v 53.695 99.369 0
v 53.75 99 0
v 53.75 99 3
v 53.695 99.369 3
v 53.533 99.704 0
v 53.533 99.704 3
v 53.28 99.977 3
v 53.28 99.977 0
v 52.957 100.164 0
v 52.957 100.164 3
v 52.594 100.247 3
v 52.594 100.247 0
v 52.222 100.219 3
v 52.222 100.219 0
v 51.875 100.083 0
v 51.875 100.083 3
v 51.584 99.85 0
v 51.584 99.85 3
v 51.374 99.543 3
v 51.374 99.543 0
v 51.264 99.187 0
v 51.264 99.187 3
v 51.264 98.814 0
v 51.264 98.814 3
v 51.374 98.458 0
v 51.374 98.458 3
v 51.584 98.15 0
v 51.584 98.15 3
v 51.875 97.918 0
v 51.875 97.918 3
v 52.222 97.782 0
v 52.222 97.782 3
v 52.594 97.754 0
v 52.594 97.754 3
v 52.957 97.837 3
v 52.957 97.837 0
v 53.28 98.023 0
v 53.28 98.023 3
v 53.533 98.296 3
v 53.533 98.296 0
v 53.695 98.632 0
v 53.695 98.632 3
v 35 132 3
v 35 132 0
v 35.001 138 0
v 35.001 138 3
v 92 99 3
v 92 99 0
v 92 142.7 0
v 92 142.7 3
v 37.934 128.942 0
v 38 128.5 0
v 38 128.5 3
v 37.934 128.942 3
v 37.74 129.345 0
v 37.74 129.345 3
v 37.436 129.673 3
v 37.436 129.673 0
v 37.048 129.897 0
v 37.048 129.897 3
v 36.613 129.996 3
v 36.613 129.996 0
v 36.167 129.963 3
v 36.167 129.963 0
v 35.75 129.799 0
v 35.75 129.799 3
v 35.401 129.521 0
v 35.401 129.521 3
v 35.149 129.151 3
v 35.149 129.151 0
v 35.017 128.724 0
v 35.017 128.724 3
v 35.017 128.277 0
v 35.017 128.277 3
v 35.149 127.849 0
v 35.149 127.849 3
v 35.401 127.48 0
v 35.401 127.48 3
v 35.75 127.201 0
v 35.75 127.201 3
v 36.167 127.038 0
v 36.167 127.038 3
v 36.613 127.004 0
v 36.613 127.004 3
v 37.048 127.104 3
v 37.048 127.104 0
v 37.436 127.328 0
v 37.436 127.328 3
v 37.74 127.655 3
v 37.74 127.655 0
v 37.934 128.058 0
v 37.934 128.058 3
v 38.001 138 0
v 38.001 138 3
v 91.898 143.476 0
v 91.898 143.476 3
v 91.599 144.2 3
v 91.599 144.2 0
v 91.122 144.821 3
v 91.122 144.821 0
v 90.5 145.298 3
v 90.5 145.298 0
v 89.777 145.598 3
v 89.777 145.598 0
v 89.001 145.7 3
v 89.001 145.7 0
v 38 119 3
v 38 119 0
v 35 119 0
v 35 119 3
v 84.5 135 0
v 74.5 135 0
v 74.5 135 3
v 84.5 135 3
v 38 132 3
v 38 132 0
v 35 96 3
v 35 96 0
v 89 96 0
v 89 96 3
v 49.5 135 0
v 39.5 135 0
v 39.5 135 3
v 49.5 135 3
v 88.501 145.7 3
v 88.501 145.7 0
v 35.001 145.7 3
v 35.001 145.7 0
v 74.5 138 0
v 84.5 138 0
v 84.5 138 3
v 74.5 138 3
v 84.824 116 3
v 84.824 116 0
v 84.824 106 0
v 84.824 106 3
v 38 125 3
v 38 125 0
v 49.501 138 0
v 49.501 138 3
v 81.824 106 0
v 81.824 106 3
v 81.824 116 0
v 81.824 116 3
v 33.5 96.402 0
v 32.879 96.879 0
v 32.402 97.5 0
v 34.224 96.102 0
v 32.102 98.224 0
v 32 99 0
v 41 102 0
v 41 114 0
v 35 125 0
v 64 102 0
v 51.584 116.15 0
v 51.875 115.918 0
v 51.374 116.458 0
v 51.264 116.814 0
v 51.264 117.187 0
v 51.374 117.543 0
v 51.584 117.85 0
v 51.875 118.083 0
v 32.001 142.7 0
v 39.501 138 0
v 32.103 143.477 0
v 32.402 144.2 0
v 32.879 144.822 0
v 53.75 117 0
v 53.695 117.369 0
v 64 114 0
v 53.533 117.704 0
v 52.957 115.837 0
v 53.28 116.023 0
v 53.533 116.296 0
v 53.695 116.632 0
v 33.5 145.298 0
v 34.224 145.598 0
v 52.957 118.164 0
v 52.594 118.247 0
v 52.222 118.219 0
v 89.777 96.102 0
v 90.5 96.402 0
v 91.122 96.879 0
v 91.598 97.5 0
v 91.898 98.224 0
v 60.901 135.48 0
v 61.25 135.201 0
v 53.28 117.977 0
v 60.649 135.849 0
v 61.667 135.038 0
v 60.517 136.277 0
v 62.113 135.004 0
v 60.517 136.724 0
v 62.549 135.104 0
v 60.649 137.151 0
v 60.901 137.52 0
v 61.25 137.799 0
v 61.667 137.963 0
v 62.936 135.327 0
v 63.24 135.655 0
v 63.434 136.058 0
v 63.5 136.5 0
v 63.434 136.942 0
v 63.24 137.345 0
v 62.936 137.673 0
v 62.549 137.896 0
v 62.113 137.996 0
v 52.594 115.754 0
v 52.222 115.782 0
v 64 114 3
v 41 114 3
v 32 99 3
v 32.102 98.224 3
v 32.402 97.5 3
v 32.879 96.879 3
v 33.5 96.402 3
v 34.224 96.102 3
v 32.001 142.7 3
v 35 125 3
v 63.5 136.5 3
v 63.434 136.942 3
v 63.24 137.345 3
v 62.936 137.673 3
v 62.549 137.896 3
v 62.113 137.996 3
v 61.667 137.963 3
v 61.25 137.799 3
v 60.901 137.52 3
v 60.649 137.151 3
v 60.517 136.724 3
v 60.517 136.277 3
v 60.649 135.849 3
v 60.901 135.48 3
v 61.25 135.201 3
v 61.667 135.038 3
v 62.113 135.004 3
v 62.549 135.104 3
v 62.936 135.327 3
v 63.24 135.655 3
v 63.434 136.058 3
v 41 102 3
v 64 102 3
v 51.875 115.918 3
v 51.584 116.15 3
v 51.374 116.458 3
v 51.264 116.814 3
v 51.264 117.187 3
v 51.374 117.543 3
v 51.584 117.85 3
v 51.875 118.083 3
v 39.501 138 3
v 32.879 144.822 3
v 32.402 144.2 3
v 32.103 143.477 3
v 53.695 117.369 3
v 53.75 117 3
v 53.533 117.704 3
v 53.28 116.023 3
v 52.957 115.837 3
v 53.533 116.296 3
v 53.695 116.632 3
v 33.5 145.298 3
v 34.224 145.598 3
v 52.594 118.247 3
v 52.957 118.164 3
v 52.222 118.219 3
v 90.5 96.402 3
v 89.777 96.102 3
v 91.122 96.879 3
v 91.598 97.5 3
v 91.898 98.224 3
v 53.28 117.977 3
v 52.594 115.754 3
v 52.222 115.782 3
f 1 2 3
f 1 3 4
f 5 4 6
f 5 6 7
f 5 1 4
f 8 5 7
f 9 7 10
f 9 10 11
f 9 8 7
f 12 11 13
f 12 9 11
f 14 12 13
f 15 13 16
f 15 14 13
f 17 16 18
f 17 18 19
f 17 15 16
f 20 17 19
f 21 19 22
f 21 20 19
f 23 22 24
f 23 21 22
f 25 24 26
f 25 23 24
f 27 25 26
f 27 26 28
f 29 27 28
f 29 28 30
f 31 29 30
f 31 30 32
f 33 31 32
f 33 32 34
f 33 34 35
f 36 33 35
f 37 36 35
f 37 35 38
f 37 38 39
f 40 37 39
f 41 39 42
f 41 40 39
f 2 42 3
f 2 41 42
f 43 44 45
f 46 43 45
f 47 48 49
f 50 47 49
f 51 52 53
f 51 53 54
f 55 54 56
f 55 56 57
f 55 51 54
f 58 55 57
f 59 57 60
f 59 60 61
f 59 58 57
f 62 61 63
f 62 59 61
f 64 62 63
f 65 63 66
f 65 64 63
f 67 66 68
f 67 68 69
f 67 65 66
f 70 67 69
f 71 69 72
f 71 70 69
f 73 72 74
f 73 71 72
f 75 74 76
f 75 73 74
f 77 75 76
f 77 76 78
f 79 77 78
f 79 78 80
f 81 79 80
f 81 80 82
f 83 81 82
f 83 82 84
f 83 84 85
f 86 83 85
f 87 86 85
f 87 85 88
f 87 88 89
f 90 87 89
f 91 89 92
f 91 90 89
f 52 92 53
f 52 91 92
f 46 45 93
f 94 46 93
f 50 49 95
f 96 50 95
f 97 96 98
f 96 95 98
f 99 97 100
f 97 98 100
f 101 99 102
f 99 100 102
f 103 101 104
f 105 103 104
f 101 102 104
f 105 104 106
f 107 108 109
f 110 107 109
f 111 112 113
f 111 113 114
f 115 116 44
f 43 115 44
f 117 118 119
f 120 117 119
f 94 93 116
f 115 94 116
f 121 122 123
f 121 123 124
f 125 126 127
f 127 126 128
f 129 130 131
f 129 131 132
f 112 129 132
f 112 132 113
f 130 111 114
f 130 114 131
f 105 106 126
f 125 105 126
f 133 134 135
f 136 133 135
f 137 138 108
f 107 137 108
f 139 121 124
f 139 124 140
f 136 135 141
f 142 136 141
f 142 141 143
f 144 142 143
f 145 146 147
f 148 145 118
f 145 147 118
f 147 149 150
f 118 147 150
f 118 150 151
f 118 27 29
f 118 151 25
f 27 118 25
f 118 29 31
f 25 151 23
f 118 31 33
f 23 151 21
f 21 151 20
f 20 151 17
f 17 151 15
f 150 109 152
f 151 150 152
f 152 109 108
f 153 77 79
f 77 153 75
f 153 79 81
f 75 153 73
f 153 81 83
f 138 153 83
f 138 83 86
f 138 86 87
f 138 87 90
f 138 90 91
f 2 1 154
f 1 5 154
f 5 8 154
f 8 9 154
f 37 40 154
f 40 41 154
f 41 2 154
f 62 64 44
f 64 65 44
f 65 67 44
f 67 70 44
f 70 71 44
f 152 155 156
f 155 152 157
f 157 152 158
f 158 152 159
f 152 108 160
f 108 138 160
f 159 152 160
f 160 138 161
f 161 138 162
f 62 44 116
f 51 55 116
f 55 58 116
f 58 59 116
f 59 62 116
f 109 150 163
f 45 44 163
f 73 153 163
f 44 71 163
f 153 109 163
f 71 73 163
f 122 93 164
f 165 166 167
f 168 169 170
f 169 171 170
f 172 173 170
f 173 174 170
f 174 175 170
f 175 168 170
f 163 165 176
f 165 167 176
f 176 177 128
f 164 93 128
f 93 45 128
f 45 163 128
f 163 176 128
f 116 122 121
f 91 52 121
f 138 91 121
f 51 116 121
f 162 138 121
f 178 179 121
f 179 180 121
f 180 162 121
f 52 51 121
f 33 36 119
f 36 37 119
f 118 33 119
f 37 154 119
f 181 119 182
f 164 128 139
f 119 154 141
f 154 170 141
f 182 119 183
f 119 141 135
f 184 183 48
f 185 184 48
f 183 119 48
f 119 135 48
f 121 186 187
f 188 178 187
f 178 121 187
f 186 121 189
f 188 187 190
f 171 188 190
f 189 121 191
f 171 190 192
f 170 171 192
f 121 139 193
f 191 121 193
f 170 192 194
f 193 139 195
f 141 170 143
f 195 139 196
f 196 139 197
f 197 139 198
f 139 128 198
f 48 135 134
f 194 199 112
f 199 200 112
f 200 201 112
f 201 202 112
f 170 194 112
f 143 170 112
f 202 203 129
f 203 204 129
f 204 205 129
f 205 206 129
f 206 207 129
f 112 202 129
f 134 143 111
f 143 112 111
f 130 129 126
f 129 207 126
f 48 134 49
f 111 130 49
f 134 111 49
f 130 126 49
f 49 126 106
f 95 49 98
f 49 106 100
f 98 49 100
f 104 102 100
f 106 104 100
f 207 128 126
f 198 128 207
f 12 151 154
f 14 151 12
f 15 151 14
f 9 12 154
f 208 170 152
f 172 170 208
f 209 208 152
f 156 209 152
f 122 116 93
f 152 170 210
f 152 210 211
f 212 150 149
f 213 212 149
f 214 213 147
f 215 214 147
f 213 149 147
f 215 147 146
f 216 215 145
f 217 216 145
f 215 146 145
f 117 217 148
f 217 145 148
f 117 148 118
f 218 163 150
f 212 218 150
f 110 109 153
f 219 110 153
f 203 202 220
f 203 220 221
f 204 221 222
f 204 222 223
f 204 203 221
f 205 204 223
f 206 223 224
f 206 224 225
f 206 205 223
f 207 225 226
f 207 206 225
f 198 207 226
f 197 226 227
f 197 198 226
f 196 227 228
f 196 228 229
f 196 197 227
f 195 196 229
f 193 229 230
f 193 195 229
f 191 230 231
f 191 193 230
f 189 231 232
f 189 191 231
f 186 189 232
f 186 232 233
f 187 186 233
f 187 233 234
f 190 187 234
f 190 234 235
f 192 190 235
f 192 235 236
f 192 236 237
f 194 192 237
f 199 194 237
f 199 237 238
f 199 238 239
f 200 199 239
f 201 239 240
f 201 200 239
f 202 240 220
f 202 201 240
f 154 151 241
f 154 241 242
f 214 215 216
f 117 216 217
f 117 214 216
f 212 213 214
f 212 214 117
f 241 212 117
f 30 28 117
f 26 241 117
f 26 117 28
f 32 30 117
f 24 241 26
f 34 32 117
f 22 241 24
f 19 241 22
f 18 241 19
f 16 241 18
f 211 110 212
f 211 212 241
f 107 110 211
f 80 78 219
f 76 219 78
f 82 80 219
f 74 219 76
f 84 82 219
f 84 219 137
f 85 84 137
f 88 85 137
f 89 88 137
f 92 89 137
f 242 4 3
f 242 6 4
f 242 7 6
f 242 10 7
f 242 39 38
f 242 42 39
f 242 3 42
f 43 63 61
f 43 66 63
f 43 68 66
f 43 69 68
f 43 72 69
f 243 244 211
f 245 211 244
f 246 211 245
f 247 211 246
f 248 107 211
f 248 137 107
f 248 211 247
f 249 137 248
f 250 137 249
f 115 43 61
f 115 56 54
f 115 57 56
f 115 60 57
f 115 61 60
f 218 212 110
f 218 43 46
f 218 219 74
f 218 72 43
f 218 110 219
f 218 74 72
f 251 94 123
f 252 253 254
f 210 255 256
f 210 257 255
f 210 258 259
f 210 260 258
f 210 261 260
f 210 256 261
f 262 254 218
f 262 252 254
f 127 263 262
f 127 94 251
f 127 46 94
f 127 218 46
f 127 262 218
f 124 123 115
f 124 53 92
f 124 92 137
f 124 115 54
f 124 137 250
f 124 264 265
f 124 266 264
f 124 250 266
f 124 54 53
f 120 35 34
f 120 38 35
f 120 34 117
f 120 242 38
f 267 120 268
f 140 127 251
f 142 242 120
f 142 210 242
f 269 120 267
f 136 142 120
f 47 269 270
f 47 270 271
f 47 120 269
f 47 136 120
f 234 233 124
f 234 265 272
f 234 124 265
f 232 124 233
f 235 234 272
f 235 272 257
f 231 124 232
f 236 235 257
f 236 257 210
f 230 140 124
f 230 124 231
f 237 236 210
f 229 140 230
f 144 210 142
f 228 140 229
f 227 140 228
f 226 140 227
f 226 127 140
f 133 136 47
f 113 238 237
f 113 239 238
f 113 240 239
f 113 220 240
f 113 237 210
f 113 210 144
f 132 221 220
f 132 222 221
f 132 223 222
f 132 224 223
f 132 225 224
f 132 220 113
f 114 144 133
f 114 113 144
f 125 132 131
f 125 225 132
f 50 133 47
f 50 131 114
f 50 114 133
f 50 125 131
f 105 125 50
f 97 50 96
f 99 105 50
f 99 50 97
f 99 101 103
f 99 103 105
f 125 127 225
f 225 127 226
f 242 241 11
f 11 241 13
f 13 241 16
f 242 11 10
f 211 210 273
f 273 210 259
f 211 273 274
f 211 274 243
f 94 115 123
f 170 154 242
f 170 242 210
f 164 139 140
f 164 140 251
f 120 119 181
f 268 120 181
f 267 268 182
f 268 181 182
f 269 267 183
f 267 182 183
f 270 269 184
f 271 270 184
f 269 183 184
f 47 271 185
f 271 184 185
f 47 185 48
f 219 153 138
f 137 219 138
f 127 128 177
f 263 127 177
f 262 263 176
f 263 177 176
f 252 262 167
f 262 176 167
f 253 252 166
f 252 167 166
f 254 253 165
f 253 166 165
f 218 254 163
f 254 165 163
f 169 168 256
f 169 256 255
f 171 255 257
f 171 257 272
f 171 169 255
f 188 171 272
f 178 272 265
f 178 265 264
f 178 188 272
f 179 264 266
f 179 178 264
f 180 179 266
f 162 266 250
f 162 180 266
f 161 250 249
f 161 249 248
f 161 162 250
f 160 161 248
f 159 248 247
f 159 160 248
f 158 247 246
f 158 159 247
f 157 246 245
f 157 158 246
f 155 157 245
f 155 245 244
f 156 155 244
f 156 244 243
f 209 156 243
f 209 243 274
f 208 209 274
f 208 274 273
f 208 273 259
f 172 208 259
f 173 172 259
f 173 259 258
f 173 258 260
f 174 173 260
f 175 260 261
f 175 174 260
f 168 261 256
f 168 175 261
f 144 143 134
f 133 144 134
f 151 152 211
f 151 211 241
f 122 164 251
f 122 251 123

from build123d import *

# Parameters (mm, degrees)
SKETCH_1_R      = 1.25
SKETCH_1_R_2    = 1.500000003
SKETCH_1_R_3    = 1.500000002
EXTRUDE_1_DEPTH = 3


with BuildPart() as part:
    # 草圖1 → 填料-伸長1 (new body)
    with BuildSketch(Plane.XY):
        with BuildLine():
            Line((88.500524103, 145.700017948), (35.000524103, 145.700292307))
            ThreePointArc((35.000524103, 145.700292307), (32.879119595, 144.821703189), (32.000508719, 142.700307692))
            Line((32.000508719, 142.700307692), (32.000300001, 99.000307693))
            ThreePointArc((32.000300001, 99.000307693), (32.878839121, 96.878853187), (35.000284616, 96.000292308))
            Line((35.000284616, 96.000292308), (89.000284615, 96.000015385))
            ThreePointArc((89.000284615, 96.000015385), (91.121639122, 96.878654505), (92.0003, 99))
            Line((92.0003, 99), (92.000408718, 142.7))
            ThreePointArc((92.000408718, 142.7), (91.121779951, 144.82129415), (89.000524103, 145.700015384))
            Line((89.000524103, 145.700015384), (88.500524103, 145.700017948))
        make_face()
        with Locations((52.50039487, 117.000202566)):
            Circle(SKETCH_1_R, mode=Mode.SUBTRACT)
        with Locations((52.500297434, 99.000202566)):
            Circle(SKETCH_1_R, mode=Mode.SUBTRACT)
        with Locations((36.500451283, 128.500284615)):
            Circle(SKETCH_1_R_2, mode=Mode.SUBTRACT)
        with Locations((62.000492306, 136.500153847)):
            Circle(SKETCH_1_R_3, mode=Mode.SUBTRACT)
        Polygon((84.824140487, 116.000036801), (84.824089205, 106.000036801), (81.824089205, 106.000052186), (81.824140487, 116.000052185), align=None, mode=Mode.SUBTRACT)
        Polygon((64.000315385, 102.00014359), (64.000376923, 114.00014359), (41.000376924, 114.000261539), (41.000315385, 102.000261539), align=None, mode=Mode.SUBTRACT)
        Polygon((38.000402565, 119.000276923), (35.000402565, 119.000292308), (35.000433334, 125.000292308), (38.000433334, 125.000276923), align=None, mode=Mode.SUBTRACT)
        Polygon((38.000469231, 132.000276923), (35.000469231, 132.000292308), (35.000500001, 138.000292308), (38.000500001, 138.000276923), align=None, mode=Mode.SUBTRACT)
        Polygon((39.500500001, 138.000269231), (39.500484616, 135.000269231), (49.500484616, 135.000217948), (49.500500001, 138.000217948), align=None, mode=Mode.SUBTRACT)
        Polygon((74.500484616, 135.000089743), (84.500484615, 135.000038461), (84.5005, 138.000038461), (74.5005, 138.000089743), align=None, mode=Mode.SUBTRACT)
    extrude(amount=EXTRUDE_1_DEPTH)


solid = part.part
